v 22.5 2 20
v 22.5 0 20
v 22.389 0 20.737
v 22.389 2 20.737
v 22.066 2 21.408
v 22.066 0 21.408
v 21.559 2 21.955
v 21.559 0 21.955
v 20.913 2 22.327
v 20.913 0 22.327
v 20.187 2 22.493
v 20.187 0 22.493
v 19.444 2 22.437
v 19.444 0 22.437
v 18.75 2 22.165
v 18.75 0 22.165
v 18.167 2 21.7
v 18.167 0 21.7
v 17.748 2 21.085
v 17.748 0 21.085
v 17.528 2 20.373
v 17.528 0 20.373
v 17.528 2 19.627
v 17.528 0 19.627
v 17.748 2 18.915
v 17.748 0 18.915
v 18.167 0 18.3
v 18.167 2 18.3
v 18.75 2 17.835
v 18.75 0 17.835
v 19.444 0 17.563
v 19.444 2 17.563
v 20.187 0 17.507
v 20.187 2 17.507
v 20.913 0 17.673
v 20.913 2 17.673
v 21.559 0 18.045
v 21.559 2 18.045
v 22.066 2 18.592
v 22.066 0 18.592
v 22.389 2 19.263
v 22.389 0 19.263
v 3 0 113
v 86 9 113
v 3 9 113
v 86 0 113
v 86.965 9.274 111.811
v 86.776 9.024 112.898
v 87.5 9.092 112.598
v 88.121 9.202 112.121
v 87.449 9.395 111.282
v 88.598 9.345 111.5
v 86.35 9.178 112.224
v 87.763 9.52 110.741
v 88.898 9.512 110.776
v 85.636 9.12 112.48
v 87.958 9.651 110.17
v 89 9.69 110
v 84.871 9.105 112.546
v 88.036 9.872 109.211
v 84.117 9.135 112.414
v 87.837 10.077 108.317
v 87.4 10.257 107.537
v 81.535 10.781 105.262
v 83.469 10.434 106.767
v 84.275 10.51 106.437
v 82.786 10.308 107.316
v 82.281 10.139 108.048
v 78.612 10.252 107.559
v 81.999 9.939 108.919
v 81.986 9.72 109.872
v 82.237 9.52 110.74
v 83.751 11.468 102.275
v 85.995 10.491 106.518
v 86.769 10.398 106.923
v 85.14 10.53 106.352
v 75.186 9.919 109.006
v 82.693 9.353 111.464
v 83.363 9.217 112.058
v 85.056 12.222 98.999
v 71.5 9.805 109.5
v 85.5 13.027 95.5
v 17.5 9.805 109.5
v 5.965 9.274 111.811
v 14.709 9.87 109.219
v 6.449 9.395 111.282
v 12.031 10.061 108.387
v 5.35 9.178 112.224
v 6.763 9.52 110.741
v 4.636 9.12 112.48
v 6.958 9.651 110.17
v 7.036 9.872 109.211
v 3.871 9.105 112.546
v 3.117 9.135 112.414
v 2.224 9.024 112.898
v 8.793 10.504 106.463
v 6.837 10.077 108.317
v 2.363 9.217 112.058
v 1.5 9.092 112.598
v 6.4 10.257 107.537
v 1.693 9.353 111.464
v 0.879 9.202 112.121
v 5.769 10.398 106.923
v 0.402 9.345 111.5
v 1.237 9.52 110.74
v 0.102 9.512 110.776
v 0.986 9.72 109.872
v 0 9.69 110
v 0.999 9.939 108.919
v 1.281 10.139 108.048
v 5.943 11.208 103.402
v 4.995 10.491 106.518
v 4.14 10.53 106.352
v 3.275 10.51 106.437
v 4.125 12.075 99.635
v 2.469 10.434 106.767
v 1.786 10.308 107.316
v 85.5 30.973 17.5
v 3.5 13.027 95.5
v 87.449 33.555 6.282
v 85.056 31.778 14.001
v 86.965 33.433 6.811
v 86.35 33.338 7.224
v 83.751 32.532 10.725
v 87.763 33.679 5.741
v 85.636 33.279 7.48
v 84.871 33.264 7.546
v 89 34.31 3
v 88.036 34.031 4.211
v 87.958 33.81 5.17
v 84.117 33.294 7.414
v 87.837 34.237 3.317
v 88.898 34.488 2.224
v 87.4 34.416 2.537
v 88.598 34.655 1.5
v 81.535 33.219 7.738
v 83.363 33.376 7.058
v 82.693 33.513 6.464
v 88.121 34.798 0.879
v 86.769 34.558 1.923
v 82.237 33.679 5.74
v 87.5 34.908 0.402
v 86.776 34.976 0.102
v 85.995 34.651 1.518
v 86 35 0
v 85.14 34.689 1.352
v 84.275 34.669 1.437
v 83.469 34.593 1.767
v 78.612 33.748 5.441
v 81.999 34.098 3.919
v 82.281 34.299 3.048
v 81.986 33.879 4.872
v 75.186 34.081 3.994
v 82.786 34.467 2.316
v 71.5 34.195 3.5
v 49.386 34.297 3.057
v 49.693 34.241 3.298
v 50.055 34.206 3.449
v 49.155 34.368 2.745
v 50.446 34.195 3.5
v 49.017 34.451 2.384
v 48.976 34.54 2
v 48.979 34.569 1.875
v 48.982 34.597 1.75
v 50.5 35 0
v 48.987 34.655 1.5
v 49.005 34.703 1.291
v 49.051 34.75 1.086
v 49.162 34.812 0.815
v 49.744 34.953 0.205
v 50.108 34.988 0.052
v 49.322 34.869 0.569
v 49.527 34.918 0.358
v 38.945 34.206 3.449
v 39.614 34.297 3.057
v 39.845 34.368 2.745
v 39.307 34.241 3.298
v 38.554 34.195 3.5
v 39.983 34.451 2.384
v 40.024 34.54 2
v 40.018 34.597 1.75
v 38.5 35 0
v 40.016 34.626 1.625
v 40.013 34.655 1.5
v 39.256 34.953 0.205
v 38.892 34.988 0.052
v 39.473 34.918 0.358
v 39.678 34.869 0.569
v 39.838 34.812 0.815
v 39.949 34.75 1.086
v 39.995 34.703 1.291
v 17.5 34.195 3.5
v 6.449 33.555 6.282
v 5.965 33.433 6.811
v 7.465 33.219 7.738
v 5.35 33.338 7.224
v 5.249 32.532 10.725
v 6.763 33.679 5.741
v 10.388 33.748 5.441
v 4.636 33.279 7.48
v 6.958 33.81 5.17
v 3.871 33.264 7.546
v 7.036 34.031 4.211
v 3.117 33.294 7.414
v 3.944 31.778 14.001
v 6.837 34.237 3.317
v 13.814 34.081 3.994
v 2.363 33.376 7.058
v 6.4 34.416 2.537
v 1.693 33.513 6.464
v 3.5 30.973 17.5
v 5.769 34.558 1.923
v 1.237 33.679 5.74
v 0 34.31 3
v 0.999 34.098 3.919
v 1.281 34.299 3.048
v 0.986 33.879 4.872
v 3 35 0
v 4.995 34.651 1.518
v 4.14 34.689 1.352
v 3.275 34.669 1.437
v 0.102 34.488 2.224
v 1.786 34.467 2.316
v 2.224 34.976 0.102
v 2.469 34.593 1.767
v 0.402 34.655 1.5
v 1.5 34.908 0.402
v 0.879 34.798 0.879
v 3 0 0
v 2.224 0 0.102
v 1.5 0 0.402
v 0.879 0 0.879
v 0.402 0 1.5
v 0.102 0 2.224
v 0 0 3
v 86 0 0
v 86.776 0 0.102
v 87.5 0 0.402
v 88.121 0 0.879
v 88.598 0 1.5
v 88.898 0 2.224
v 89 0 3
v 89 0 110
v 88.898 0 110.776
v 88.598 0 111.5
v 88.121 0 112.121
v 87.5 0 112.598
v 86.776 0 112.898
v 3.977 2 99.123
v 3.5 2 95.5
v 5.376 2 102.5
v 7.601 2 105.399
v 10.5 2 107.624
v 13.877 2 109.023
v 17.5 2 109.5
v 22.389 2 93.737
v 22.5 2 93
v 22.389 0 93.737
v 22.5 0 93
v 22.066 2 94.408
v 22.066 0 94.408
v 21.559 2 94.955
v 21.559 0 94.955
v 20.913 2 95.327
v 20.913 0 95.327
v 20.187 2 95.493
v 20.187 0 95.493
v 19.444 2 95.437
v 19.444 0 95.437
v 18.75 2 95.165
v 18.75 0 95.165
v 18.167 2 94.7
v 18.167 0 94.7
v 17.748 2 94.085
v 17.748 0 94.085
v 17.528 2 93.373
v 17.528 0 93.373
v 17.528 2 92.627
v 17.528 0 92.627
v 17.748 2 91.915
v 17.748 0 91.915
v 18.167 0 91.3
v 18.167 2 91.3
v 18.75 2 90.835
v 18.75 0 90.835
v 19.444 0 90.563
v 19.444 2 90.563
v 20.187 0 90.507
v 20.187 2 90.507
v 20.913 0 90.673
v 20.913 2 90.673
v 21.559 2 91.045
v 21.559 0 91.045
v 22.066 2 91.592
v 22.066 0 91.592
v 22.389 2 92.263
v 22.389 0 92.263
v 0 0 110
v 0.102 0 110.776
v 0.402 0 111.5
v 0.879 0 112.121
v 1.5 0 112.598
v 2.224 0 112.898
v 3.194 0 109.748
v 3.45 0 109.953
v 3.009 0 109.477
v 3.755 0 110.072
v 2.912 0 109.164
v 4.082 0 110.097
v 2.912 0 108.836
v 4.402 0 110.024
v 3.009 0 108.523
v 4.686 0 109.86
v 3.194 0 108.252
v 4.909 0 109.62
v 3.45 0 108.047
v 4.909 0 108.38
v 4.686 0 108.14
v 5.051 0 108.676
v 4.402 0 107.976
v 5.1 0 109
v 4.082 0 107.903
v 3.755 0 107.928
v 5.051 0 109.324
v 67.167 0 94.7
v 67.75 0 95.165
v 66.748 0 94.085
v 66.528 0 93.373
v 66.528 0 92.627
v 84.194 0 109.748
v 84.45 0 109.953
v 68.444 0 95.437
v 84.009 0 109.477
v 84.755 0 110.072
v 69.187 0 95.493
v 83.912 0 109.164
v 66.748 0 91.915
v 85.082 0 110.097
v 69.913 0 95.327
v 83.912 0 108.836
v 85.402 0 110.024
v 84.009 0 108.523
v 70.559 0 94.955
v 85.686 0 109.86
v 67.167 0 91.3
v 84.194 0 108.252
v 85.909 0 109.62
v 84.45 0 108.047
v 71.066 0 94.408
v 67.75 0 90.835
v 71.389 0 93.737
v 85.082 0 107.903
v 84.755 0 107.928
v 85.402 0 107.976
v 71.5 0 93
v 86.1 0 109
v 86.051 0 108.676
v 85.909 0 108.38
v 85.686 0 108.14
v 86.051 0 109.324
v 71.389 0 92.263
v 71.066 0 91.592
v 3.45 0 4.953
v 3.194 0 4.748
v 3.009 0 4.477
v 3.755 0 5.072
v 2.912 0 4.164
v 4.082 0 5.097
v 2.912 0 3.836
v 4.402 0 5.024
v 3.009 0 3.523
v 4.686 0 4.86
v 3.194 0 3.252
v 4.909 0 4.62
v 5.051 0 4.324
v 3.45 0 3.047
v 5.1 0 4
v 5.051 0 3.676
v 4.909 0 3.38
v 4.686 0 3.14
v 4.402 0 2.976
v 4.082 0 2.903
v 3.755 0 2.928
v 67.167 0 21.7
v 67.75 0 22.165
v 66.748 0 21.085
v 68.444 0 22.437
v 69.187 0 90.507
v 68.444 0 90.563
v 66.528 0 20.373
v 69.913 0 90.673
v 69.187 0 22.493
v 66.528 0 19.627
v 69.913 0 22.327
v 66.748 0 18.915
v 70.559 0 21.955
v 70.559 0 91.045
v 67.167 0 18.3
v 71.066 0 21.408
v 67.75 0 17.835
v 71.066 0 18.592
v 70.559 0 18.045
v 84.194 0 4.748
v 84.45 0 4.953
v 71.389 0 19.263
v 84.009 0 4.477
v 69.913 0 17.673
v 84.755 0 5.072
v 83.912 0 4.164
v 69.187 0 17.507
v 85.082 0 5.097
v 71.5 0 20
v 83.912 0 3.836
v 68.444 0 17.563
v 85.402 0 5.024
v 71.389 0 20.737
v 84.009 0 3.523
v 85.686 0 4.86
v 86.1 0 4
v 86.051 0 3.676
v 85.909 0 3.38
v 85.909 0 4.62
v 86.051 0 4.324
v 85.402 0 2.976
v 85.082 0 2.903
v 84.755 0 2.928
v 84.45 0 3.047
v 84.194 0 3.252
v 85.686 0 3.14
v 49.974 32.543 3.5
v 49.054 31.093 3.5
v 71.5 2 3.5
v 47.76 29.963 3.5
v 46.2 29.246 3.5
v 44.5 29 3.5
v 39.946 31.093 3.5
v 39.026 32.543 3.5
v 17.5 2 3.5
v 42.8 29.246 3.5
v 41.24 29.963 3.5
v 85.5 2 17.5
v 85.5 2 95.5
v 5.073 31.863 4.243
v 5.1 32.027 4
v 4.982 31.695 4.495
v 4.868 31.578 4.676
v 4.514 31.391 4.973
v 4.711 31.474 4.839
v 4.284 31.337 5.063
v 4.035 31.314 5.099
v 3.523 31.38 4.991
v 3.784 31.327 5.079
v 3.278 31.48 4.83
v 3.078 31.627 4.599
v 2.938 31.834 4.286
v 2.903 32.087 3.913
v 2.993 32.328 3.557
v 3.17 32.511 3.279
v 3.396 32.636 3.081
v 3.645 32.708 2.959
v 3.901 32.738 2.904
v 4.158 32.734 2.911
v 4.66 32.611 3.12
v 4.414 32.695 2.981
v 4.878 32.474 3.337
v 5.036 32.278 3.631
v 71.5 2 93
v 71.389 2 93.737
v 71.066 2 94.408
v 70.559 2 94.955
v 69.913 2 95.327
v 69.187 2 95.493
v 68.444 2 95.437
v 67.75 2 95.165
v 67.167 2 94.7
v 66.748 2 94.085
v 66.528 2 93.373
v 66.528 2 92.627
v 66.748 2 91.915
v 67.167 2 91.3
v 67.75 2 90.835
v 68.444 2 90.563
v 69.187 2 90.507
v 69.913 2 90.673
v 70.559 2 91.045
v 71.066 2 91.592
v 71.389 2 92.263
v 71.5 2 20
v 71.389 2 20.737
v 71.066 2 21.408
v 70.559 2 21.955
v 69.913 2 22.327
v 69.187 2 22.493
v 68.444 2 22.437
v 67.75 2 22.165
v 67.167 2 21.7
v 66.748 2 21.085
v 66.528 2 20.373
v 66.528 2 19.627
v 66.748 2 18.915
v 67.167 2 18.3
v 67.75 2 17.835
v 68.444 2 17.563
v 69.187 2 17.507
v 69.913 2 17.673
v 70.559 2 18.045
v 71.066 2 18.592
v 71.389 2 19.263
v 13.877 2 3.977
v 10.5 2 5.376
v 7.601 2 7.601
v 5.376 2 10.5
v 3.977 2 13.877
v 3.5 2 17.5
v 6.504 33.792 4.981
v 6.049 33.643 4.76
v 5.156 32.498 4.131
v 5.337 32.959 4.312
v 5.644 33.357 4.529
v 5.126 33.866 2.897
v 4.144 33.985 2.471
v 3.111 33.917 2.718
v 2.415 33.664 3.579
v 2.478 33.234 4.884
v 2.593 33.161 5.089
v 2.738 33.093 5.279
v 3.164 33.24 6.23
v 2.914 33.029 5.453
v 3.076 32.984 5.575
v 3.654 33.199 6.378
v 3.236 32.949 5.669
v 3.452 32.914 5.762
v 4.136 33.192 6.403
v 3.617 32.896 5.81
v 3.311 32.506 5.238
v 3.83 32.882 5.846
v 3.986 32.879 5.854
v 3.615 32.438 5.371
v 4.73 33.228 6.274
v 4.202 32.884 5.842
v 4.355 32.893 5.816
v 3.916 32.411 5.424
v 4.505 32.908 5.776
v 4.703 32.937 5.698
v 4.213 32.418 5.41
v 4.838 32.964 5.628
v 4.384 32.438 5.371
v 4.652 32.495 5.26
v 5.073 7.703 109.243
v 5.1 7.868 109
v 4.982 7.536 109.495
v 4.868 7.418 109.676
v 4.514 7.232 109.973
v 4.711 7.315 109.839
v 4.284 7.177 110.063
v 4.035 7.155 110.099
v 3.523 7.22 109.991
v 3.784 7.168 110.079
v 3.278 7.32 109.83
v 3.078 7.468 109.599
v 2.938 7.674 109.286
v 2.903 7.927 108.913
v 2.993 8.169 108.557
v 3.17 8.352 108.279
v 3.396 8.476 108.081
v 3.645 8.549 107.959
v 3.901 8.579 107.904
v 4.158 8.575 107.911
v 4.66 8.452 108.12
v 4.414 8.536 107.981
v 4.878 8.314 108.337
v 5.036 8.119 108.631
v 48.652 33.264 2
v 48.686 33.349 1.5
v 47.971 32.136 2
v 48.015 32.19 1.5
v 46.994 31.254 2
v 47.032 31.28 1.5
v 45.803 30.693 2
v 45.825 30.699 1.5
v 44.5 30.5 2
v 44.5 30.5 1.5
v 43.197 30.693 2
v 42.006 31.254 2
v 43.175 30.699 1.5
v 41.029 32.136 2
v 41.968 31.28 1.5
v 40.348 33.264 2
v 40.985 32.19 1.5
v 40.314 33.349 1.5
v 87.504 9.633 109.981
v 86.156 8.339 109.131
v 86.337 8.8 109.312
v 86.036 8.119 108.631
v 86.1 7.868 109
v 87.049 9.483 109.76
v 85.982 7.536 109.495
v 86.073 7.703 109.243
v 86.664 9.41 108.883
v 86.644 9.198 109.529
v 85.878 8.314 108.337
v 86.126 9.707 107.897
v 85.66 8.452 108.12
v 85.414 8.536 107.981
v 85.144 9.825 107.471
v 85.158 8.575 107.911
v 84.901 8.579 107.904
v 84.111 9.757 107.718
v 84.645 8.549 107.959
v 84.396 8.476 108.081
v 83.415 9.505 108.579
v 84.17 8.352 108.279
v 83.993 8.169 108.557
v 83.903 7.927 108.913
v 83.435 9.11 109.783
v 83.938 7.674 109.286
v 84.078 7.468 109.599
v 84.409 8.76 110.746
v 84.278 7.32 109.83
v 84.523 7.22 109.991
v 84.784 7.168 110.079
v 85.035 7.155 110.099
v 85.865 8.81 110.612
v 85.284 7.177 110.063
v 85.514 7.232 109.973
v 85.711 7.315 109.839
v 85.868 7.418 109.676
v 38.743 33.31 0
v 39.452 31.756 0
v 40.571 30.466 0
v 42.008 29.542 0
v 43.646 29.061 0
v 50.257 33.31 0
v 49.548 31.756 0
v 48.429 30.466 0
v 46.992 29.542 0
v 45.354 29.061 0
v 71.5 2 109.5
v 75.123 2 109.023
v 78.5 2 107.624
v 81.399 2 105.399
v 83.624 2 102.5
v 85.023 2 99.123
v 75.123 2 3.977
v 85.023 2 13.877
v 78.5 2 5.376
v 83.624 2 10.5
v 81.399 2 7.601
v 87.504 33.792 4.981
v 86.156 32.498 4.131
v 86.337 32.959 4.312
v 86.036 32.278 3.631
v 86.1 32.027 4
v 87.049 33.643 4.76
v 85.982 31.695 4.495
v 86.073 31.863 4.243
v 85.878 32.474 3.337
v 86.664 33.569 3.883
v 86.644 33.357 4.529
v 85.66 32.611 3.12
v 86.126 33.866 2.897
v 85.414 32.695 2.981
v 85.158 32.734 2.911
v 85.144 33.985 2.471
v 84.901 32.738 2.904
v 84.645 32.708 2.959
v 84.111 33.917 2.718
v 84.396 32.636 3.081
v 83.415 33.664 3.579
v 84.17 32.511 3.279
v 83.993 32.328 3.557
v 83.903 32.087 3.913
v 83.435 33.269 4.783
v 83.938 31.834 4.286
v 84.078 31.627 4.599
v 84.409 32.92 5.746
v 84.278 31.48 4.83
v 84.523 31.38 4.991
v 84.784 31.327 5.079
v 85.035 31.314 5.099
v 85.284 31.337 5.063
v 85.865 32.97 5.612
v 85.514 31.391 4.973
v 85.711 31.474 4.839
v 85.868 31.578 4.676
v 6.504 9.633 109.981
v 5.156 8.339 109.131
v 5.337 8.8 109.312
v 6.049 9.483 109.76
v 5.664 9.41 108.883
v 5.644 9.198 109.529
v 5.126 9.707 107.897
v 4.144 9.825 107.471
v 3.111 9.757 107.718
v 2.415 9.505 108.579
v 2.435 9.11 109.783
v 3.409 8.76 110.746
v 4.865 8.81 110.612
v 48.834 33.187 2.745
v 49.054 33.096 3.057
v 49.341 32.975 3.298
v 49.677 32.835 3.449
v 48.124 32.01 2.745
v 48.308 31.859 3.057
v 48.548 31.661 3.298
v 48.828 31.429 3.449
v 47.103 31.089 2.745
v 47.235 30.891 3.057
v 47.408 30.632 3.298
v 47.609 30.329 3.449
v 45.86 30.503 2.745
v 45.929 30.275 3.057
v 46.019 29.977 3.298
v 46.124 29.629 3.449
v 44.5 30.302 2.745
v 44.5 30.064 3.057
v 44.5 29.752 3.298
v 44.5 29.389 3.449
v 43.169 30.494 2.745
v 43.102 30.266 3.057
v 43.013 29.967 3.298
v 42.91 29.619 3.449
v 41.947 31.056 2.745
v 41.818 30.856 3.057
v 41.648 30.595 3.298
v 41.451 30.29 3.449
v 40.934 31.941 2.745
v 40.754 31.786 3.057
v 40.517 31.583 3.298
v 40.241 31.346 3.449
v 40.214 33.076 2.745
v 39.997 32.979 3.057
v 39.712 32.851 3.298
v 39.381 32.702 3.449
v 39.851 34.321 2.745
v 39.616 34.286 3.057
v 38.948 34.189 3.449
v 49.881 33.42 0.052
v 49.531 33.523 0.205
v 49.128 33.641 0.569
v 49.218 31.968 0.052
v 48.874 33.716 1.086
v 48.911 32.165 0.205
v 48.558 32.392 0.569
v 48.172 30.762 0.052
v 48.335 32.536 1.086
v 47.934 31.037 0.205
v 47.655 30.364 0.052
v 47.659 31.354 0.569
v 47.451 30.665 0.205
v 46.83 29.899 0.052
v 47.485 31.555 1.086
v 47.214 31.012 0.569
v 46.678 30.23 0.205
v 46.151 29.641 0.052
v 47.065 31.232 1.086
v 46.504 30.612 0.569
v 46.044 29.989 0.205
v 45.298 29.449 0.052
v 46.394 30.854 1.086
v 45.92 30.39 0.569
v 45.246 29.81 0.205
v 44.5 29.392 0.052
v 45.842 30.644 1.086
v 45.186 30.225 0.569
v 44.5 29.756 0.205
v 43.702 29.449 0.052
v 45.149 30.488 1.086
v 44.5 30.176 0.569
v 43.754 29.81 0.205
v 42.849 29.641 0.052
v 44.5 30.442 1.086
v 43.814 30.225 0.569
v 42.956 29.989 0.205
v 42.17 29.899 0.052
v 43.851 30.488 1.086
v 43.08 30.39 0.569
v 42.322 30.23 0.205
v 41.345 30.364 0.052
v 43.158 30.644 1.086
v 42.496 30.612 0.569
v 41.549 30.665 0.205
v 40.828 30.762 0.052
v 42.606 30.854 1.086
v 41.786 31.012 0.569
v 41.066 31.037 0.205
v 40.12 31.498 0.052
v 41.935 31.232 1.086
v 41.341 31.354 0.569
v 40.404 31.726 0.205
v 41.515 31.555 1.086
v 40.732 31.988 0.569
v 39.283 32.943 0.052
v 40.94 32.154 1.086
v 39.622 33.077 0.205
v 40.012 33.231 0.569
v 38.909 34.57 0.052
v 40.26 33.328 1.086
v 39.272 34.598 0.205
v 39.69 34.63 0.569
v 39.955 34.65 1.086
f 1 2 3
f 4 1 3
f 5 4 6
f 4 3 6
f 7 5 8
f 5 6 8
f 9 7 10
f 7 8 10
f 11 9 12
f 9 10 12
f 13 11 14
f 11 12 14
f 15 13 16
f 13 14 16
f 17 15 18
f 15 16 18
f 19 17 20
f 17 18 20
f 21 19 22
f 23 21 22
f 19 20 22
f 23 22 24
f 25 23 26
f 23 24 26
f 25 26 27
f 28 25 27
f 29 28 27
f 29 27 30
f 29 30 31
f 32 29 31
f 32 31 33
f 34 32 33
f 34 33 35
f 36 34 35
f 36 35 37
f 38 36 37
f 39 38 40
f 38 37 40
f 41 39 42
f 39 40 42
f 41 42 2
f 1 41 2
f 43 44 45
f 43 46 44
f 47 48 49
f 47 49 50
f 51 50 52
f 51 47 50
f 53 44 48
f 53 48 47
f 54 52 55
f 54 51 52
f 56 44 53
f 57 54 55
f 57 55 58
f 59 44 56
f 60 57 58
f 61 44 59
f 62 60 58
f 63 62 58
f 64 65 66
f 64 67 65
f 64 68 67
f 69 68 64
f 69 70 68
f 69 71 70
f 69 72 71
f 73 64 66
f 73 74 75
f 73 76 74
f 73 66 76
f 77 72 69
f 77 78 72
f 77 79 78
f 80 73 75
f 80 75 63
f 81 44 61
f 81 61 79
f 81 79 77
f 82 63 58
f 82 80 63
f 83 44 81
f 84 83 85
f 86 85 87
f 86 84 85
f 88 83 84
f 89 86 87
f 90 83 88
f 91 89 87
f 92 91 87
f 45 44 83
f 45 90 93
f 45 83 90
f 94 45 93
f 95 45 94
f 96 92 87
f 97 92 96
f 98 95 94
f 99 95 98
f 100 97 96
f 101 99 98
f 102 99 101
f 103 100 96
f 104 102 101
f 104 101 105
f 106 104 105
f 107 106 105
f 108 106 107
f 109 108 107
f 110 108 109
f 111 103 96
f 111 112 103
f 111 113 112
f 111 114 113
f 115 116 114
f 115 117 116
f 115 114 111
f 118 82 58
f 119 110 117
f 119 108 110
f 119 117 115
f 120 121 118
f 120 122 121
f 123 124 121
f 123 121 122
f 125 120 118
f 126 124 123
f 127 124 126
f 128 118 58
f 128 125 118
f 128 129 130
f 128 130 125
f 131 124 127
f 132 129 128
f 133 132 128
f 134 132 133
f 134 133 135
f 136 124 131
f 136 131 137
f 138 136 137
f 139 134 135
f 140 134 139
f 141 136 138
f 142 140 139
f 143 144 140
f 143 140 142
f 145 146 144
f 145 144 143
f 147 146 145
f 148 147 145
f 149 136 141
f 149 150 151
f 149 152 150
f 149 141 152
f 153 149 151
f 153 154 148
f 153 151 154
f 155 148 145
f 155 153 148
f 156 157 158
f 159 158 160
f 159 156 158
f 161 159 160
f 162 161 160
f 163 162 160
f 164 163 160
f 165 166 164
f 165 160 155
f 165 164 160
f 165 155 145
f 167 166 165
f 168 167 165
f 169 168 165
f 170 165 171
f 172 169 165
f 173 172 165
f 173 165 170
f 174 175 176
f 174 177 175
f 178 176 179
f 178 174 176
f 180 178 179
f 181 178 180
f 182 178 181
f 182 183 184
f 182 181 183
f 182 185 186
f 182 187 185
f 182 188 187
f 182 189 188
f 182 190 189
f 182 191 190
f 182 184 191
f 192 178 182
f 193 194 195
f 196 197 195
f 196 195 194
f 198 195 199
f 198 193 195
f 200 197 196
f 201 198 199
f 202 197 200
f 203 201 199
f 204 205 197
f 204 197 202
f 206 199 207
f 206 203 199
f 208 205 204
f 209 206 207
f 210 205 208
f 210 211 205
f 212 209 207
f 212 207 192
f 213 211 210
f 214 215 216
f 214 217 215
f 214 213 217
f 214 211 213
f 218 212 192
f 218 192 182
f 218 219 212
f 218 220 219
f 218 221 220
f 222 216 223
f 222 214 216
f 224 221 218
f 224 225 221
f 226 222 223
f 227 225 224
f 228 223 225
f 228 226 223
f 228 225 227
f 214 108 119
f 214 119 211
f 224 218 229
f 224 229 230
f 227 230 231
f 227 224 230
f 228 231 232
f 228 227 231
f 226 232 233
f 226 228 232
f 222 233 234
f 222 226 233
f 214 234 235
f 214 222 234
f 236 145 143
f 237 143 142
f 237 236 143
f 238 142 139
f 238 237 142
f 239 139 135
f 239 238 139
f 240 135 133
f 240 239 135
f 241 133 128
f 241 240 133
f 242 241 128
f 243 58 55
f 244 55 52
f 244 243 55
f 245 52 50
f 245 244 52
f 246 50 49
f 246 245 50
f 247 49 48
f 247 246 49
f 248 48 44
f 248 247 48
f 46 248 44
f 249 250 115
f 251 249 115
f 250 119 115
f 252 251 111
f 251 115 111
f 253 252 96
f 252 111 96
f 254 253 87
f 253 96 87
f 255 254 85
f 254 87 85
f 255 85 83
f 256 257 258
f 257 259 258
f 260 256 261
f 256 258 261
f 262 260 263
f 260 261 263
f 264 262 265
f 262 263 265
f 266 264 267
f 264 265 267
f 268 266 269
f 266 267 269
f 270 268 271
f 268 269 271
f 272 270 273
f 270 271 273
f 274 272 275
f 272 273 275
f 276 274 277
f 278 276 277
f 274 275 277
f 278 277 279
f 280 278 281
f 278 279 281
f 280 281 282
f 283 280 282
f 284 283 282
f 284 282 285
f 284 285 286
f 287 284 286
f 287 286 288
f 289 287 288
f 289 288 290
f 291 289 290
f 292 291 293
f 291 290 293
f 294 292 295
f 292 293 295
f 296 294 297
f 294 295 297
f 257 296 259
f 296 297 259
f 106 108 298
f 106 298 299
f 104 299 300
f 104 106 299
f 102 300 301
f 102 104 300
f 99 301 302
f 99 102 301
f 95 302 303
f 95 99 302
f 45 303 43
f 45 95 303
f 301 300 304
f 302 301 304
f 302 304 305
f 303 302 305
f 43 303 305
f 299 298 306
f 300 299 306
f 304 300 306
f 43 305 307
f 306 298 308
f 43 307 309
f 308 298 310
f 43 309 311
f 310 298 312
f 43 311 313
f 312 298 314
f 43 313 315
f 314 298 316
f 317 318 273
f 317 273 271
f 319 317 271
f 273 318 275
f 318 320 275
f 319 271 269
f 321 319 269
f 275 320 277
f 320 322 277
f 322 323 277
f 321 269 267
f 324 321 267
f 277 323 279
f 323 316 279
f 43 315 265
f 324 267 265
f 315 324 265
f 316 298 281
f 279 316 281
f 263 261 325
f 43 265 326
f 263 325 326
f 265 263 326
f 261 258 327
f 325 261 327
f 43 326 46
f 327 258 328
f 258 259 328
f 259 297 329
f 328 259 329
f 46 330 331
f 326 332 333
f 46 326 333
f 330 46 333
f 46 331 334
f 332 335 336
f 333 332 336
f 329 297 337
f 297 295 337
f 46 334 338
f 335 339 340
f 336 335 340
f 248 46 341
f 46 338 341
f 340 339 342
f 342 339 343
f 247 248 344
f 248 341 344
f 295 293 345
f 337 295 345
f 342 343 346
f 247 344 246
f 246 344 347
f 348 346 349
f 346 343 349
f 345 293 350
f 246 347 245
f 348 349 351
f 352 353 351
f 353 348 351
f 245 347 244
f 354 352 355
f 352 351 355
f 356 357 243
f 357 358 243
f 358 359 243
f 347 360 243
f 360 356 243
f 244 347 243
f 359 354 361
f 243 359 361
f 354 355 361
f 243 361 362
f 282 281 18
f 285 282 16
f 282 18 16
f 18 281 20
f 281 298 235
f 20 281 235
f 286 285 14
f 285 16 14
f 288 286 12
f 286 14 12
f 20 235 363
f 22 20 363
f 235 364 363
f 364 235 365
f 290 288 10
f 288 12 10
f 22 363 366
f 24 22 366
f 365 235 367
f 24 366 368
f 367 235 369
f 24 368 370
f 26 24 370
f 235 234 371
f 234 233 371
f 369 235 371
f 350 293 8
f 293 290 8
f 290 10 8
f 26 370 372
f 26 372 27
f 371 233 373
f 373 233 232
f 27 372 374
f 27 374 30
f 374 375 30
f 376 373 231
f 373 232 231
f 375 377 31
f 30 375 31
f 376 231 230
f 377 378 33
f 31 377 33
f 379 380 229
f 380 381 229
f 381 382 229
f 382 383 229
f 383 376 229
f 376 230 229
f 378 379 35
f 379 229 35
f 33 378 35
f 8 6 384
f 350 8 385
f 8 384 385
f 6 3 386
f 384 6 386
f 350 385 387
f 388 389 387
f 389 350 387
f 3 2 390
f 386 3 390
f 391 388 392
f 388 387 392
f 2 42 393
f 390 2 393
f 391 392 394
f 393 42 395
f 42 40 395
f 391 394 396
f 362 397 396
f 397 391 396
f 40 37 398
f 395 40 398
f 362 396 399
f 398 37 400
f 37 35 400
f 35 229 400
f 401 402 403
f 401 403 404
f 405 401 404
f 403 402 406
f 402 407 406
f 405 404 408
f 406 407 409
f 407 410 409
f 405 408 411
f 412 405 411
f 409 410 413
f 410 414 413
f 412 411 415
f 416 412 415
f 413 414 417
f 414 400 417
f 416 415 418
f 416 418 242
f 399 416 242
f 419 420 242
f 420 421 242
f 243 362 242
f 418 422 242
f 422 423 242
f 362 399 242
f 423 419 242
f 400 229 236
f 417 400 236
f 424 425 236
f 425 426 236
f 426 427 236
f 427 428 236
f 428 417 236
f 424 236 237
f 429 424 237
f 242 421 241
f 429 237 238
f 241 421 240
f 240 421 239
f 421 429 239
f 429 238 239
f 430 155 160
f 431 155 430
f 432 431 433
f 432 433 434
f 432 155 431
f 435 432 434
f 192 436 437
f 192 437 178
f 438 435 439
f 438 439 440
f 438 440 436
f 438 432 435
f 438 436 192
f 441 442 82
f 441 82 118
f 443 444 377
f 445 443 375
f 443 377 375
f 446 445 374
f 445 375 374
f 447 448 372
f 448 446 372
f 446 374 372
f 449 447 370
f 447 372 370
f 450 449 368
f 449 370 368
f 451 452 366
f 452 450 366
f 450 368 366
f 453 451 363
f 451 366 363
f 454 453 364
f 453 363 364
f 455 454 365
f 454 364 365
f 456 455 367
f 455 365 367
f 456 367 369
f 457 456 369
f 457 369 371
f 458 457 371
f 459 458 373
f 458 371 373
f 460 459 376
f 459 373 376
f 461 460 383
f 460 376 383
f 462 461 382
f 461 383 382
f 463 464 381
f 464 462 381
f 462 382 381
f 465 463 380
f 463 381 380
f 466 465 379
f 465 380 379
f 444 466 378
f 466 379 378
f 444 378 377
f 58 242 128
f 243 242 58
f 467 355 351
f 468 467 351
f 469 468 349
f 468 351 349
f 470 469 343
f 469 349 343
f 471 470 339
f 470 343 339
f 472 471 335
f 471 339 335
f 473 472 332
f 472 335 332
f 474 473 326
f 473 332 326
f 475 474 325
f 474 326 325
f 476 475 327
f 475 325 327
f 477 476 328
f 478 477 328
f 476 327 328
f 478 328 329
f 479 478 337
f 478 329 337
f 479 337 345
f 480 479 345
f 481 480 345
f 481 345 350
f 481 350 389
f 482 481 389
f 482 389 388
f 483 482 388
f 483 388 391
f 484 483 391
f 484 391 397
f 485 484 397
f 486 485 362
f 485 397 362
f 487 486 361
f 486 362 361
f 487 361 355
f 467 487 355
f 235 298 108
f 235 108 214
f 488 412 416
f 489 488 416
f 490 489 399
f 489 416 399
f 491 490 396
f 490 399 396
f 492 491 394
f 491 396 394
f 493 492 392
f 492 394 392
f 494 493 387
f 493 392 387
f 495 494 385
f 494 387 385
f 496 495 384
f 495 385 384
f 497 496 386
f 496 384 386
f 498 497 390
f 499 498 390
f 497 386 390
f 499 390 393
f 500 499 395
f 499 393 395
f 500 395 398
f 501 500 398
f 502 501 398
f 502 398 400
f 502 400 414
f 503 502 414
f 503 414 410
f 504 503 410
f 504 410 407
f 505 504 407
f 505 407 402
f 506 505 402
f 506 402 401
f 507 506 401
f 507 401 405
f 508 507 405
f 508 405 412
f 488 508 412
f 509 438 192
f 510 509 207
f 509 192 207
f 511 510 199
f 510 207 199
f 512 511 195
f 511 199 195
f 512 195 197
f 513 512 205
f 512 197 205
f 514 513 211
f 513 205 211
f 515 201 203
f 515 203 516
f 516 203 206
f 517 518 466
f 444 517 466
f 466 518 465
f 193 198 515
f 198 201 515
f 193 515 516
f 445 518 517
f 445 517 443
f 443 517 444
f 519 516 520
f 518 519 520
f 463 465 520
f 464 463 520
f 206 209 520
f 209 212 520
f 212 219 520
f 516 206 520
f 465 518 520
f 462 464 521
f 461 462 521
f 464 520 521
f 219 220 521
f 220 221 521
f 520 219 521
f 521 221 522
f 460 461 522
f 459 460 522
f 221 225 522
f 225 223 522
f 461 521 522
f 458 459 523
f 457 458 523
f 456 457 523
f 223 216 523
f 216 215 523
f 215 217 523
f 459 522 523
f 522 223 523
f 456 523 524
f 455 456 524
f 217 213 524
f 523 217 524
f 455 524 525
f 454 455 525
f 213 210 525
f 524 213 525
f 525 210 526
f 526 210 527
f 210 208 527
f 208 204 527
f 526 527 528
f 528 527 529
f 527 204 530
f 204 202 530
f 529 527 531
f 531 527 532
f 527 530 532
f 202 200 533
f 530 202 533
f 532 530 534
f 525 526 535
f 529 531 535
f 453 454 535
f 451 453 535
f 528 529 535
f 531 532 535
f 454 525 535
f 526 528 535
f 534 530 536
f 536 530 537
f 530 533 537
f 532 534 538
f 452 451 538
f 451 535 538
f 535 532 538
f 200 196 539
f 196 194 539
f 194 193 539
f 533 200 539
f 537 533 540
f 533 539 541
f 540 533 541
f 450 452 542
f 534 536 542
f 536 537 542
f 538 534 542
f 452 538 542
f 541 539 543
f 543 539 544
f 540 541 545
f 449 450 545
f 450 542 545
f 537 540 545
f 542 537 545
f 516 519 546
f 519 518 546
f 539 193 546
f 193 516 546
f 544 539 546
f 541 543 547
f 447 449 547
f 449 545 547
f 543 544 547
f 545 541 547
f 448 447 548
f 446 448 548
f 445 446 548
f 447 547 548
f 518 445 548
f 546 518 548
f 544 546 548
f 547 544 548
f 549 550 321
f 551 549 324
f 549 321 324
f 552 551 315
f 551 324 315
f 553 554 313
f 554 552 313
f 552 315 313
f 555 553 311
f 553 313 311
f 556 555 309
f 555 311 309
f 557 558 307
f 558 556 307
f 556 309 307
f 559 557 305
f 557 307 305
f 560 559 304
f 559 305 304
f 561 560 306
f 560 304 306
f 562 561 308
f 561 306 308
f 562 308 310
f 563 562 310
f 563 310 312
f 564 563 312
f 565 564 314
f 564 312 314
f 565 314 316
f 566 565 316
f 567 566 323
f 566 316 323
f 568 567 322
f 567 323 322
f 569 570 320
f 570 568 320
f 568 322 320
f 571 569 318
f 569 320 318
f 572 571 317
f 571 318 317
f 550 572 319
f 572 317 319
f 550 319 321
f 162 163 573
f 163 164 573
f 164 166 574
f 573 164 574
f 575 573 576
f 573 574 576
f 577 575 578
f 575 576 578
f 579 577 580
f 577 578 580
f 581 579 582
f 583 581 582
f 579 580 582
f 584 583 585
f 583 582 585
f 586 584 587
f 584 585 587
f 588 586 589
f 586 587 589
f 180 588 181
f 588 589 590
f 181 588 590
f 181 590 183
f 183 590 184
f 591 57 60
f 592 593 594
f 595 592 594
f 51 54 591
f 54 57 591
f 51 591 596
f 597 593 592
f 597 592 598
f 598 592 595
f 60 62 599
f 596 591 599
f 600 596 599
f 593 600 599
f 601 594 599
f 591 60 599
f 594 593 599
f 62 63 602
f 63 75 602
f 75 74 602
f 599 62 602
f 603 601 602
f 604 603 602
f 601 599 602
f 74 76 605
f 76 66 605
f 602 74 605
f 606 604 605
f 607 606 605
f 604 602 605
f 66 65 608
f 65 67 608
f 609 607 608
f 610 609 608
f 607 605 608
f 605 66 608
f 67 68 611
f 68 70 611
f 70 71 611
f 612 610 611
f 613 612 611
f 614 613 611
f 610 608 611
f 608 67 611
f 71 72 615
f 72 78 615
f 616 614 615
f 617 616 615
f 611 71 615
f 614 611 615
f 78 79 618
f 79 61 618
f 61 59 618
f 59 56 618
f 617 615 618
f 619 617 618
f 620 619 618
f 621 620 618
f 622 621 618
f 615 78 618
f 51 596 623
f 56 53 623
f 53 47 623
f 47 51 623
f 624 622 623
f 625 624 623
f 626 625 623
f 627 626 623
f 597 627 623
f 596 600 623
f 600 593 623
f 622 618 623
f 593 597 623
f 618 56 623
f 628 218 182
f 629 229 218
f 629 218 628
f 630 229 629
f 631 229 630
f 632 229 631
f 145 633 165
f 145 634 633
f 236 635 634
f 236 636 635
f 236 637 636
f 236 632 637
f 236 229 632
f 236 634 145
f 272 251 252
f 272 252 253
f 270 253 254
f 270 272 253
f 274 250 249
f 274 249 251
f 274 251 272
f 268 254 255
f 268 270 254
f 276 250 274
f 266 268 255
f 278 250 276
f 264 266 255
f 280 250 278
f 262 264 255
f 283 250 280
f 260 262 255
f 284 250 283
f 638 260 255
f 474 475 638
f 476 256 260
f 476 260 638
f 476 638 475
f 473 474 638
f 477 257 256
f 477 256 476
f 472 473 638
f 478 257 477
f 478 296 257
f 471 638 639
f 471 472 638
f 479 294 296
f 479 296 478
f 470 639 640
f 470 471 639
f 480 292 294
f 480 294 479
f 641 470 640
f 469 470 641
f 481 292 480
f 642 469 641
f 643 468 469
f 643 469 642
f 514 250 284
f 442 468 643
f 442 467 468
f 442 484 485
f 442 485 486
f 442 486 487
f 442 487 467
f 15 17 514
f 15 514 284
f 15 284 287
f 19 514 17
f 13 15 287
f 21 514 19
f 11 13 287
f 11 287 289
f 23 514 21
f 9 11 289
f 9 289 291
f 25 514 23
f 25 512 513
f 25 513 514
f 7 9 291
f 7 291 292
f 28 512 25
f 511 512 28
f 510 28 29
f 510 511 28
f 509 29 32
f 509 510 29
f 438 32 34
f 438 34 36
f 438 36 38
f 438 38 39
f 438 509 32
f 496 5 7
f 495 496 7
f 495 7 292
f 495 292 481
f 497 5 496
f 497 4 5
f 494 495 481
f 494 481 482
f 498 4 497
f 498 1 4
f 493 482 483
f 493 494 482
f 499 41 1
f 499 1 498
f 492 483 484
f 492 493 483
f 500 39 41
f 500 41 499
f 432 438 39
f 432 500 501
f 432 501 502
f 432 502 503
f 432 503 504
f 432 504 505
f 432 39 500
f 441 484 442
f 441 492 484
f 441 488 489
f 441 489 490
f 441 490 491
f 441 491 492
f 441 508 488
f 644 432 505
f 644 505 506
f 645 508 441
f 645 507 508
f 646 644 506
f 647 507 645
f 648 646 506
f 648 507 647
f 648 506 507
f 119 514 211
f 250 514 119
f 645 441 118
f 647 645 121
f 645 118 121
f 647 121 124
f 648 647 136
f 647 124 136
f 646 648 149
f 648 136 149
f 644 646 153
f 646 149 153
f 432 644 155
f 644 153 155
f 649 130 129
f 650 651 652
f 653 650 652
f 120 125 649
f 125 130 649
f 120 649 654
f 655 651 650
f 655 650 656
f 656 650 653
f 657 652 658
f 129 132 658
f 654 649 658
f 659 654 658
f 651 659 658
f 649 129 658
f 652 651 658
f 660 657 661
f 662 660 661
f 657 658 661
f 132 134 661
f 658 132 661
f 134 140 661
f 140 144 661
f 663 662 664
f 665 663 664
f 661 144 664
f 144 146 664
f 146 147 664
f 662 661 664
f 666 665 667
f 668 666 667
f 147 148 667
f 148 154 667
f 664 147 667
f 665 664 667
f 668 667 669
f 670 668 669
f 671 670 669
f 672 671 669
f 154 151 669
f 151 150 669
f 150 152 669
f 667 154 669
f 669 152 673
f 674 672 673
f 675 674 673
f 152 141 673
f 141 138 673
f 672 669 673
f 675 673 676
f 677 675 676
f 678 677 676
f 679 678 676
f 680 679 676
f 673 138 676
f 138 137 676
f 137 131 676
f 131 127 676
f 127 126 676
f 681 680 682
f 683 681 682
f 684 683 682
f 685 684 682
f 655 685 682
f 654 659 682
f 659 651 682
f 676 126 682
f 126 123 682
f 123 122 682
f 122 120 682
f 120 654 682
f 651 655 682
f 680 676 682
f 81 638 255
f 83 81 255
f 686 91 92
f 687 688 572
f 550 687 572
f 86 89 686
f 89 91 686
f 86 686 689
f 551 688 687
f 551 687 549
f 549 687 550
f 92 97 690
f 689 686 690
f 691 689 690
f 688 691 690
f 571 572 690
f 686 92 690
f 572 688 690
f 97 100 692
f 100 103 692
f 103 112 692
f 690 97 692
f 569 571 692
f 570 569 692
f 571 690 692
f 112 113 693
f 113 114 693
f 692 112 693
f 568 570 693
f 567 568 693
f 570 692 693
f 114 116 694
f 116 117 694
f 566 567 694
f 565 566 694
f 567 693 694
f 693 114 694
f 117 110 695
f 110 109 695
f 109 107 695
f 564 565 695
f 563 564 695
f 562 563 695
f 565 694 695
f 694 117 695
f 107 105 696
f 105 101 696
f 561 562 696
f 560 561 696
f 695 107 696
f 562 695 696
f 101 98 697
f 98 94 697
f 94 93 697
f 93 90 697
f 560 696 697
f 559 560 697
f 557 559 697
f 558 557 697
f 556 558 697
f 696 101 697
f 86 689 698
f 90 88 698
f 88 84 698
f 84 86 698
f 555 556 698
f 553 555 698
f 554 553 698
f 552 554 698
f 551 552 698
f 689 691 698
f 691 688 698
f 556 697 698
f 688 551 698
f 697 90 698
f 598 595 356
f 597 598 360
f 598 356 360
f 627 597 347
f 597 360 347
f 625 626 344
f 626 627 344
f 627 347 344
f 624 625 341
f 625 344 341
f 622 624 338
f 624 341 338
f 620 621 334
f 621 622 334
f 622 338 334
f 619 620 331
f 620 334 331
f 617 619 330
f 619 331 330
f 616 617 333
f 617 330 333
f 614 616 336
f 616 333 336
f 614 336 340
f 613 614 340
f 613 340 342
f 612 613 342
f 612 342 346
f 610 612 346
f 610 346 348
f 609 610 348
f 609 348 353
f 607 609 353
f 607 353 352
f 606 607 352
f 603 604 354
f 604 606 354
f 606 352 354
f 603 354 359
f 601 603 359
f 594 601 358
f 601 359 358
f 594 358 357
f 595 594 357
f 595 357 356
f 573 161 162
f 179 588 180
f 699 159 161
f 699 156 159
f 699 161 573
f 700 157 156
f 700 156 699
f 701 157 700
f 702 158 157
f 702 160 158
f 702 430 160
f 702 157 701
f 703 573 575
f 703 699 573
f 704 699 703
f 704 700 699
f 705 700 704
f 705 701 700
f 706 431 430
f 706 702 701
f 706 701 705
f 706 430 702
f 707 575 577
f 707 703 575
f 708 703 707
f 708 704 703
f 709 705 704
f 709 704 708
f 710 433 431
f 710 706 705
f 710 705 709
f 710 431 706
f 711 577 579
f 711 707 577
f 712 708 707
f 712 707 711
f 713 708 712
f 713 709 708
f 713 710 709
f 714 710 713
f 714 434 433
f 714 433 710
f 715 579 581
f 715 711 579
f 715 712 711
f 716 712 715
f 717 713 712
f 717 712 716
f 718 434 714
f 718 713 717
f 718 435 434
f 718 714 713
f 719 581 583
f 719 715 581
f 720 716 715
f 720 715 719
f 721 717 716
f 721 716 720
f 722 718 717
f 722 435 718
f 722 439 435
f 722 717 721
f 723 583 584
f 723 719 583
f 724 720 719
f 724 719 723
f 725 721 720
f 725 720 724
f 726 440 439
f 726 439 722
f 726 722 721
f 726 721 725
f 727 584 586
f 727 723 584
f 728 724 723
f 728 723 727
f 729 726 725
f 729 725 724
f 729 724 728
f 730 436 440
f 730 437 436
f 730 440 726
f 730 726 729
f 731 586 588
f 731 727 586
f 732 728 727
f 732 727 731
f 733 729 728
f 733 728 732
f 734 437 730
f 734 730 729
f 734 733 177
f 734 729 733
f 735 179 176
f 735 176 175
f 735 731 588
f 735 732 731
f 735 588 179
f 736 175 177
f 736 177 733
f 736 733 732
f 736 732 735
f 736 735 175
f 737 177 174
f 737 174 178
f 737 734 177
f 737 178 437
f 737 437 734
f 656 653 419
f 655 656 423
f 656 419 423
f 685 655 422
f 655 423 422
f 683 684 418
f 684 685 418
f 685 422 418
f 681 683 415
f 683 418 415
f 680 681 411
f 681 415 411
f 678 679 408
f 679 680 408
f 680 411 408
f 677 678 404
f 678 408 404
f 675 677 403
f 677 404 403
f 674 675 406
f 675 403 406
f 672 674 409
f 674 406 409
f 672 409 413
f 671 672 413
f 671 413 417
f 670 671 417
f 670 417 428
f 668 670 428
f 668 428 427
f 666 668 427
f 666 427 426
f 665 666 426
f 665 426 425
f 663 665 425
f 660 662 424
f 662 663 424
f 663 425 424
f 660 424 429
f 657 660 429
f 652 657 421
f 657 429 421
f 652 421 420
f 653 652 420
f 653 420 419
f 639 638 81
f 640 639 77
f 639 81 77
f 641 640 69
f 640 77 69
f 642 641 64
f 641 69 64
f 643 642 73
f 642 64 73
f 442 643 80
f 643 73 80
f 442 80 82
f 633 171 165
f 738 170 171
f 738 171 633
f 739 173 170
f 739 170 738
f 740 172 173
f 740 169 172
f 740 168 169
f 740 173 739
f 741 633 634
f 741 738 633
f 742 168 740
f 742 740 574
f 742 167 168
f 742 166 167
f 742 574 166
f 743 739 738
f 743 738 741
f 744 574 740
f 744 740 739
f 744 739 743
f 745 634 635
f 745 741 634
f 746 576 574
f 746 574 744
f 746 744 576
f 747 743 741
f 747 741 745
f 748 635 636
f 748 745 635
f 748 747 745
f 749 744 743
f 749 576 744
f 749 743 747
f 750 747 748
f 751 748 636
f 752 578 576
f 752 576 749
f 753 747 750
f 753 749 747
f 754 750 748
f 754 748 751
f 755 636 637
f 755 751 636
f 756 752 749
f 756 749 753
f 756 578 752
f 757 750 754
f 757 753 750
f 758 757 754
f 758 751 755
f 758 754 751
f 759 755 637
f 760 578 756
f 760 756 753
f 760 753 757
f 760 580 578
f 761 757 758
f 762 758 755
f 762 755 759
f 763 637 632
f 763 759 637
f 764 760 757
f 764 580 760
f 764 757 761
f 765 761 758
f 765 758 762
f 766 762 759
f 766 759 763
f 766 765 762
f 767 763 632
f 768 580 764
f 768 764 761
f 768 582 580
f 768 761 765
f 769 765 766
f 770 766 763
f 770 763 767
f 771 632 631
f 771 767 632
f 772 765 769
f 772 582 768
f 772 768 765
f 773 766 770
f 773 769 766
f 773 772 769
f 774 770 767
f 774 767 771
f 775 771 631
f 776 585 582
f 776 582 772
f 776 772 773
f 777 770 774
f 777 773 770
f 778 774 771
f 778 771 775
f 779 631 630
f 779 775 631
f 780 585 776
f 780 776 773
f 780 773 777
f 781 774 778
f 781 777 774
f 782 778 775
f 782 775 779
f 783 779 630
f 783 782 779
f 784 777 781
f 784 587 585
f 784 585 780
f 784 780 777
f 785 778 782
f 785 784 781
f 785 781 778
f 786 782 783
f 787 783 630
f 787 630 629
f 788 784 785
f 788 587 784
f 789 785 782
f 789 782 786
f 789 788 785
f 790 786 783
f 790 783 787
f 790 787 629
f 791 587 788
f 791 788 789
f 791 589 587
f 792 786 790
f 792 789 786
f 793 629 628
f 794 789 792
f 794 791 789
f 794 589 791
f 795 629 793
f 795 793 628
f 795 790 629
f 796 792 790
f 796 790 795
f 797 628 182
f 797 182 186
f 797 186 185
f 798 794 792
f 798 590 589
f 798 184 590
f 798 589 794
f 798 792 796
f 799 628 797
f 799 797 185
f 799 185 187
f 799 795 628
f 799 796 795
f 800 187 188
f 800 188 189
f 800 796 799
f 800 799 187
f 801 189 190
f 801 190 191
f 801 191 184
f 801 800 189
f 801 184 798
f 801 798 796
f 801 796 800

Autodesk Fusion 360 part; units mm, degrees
sketch "Sketch1" plane through (0, 0, 0) normal (0, 1, 0) x (1, 0, 0)
  line L0 (0, 0) -> (89, 0)
  line L1 (89, 0) -> (89, -113)
  line L2 (89, -113) -> (0, -113)
  line L3 (0, -113) -> (0, 0)
  line L4 (0, 0) -> (4, 0)
  line L5 (4, 0) -> (4, -4)
  line L6 (4, -4) -> (0, -4)
  line L7 (0, -4) -> (0, 0)
  line L8 (89, 0) -> (85, 0)
  line L9 (85, 0) -> (85, -4)
  line L10 (85, -4) -> (89, -4)
  line L11 (89, -4) -> (89, 0)
  line L12 (89, -113) -> (85, -113)
  line L13 (85, -113) -> (85, -109)
  line L14 (85, -109) -> (89, -109)
  line L15 (89, -109) -> (89, -113)
  line L16 (0, -113) -> (4, -113)
  line L17 (4, -113) -> (4, -109)
  line L18 (4, -109) -> (0, -109)
  line L19 (0, -109) -> (0, -113)
  circle A0 centre (4, -4) radius 1.1
  circle A1 centre (85, -4) radius 1.1
  circle A2 centre (85, -109) radius 1.1
  circle A3 centre (4, -109) radius 1.1
  circle A4 centre (20, -20) radius 2.5
  line L20 (89, 0) -> (69, 0)
  line L21 (69, 0) -> (69, -20)
  line L22 (69, -20) -> (89, -20)
  line L23 (89, -20) -> (89, 0)
  line L24 (0, 0) -> (20, 0)
  line L25 (20, 0) -> (20, -20)
  line L26 (20, -20) -> (0, -20)
  line L27 (0, -20) -> (0, 0)
  line L28 (0, -113) -> (20, -113)
  line L29 (20, -113) -> (20, -93)
  line L30 (20, -93) -> (0, -93)
  line L31 (0, -93) -> (0, -113)
  line L32 (89, -113) -> (69, -113)
  line L33 (69, -113) -> (69, -93)
  line L34 (69, -93) -> (89, -93)
  line L35 (89, -93) -> (89, -113)
  circle A5 centre (69, -20) radius 2.5
  circle A6 centre (20, -93) radius 2.5
  circle A7 centre (69, -93) radius 2.5
  dimension "d1" = 89
  dimension "d2" = 113
  dimension "d3" = 4
  dimension "d4" = 4
  dimension "d5" = 4
  dimension "d6" = 4
  dimension "d7" = 4
  dimension "d8" = 4
  dimension "d9" = 4
  dimension "d10" = 4
  dimension "d11" = 2.2
  dimension "d12" = 2.2
  dimension "d13" = 2.2
  dimension "d14" = 2.2
  dimension "d30" = 5
  dimension "d31" = 20
  dimension "d32" = 20
  dimension "d33" = 20
  dimension "d34" = 20
  dimension "d35" = 20
  dimension "d36" = 20
  dimension "d37" = 5
  dimension "d38" = 5
  dimension "d39" = 5
extrude "Extrude1" add sketch "Sketch1" along normal blind 2
sketch "Sketch2" plane through (0, 2, 0) normal (0, 1, 0) x (-1, 0, 0)
  line L0 (0, 0) -> (0, 113)
  line L1 (0, 113) -> (-89, 113)
  line L2 (-89, 113) -> (-89, 0)
  line L3 (-89, 0) -> (0, 0)
  line L4 (0, 0) -> (-89, 0)
  line L5 (-89, 0) -> (-89, 3.5)
  line L6 (-89, 3.5) -> (0, 3.5)
  line L7 (0, 3.5) -> (0, 0)
  line L8 (0, 0) -> (-3.5, 0)
  line L9 (-3.5, 0) -> (-3.5, 113)
  line L10 (-3.5, 113) -> (0, 113)
  line L11 (0, 113) -> (0, 0)
  line L12 (0, 113) -> (-89, 113)
  line L13 (-89, 113) -> (-89, 109.5)
  line L14 (-89, 109.5) -> (0, 109.5)
  line L15 (0, 109.5) -> (0, 113)
  line L16 (-89, 113) -> (-85.5, 113)
  line L17 (-85.5, 113) -> (-85.5, 0)
  line L18 (-85.5, 0) -> (-89, 0)
  line L19 (-89, 0) -> (-89, 113)
  dimension "d17" = 3.5
  dimension "d18" = 3.5
  dimension "d19" = 3.5
  dimension "d20" = 3.5
extrude "Extrude2" add sketch "Sketch2" along normal blind 33 contours L0 L3 L4 L6 L7 L8 L9 L11 | L0 L6 L9 L11 L14 | L3 L4 L6 L9 L17 | L0 L1 L9 L10 L11 L12 L14 L15 | L2 L3 L4 L5 L6 L17 L18 L19 | L1 L9 L12 L14 L17 | L2 L6 L14 L17 L19 | L1 L2 L12 L13 L14 L16 L17 L19
sketch "Sketch3" plane through (0, 0, 0) normal (-1, 0, 0) x (0, 0, 1)
  line L0 (0, 0) -> (113, 0)
  line L1 (113, 0) -> (113, 35)
  line L2 (113, 35) -> (0, 35)
  line L3 (0, 35) -> (0, 0)
  line L4 (113, 0) -> (113, 9)
  line L5 (113, 9) -> (0, 35)
  dimension "d23" = 9
extrude "Extrude3" cut sketch "Sketch3" against normal blind 92 contours L1 L2 L5
fillet "Fillet1" radius 14 4 edges at (3.5, 18.0973, 3.5) (85.5, 18.0973, 3.5) (85.5, 5.9027, 109.5) (3.5, 5.9027, 109.5)
extrude "Extrude4" cut sketch "Sketch1" along normal blind 50 contours L5 L6 A0 | L5 L6 A0 | L9 L10 A1 | L9 L10 A1 | L17 L18 A3 | L17 L18 A3 | L13 L14 A2 | L13 L14 A2
extrude "Extrude5" cut sketch "Sketch1" along normal blind 5 contours A4 L25 L26 | A4 L25 L26 | L21 L22 A5 | L21 L22 A5 | L29 L30 A6 | L29 L30 A6 | L33 L34 A7 | L33 L34 A7
fillet "Fillet2" radius 3 4 edges at (0, 4.5, 113) (89, 4.5, 113) (89, 17.5, 0) (0, 17.5, 0)
fillet "Fillet3" radius 2 4 edges at (4, 9.6673, 110.1) (85, 9.6673, 110.1) (85, 33.8265, 5.1) (4, 33.8265, 5.1)
sketch "Sketch4" plane through (0, 0, 0) normal (0, 0, -1) x (-1, 0, 0)
  line L0 (-3, 0) -> (-3, 35)
  line L1 (-3, 35) -> (-86, 35)
  line L2 (-86, 35) -> (-86, 0)
  line L3 (-86, 0) -> (-3, 0)
  line L4 (-86, 35) -> (-44.5, 35)
  circle A0 centre (-44.5, 35) radius 4.5
extrude "Extrude6" cut sketch "Sketch4" against normal blind 6 contours L1 L4 A0 picked at (-47.4832, 34.7764)
fillet "Fillet4" radius 1.5 2 edges at (44.5, 30.5, 0) (44.5, 30.5, 3.5)
